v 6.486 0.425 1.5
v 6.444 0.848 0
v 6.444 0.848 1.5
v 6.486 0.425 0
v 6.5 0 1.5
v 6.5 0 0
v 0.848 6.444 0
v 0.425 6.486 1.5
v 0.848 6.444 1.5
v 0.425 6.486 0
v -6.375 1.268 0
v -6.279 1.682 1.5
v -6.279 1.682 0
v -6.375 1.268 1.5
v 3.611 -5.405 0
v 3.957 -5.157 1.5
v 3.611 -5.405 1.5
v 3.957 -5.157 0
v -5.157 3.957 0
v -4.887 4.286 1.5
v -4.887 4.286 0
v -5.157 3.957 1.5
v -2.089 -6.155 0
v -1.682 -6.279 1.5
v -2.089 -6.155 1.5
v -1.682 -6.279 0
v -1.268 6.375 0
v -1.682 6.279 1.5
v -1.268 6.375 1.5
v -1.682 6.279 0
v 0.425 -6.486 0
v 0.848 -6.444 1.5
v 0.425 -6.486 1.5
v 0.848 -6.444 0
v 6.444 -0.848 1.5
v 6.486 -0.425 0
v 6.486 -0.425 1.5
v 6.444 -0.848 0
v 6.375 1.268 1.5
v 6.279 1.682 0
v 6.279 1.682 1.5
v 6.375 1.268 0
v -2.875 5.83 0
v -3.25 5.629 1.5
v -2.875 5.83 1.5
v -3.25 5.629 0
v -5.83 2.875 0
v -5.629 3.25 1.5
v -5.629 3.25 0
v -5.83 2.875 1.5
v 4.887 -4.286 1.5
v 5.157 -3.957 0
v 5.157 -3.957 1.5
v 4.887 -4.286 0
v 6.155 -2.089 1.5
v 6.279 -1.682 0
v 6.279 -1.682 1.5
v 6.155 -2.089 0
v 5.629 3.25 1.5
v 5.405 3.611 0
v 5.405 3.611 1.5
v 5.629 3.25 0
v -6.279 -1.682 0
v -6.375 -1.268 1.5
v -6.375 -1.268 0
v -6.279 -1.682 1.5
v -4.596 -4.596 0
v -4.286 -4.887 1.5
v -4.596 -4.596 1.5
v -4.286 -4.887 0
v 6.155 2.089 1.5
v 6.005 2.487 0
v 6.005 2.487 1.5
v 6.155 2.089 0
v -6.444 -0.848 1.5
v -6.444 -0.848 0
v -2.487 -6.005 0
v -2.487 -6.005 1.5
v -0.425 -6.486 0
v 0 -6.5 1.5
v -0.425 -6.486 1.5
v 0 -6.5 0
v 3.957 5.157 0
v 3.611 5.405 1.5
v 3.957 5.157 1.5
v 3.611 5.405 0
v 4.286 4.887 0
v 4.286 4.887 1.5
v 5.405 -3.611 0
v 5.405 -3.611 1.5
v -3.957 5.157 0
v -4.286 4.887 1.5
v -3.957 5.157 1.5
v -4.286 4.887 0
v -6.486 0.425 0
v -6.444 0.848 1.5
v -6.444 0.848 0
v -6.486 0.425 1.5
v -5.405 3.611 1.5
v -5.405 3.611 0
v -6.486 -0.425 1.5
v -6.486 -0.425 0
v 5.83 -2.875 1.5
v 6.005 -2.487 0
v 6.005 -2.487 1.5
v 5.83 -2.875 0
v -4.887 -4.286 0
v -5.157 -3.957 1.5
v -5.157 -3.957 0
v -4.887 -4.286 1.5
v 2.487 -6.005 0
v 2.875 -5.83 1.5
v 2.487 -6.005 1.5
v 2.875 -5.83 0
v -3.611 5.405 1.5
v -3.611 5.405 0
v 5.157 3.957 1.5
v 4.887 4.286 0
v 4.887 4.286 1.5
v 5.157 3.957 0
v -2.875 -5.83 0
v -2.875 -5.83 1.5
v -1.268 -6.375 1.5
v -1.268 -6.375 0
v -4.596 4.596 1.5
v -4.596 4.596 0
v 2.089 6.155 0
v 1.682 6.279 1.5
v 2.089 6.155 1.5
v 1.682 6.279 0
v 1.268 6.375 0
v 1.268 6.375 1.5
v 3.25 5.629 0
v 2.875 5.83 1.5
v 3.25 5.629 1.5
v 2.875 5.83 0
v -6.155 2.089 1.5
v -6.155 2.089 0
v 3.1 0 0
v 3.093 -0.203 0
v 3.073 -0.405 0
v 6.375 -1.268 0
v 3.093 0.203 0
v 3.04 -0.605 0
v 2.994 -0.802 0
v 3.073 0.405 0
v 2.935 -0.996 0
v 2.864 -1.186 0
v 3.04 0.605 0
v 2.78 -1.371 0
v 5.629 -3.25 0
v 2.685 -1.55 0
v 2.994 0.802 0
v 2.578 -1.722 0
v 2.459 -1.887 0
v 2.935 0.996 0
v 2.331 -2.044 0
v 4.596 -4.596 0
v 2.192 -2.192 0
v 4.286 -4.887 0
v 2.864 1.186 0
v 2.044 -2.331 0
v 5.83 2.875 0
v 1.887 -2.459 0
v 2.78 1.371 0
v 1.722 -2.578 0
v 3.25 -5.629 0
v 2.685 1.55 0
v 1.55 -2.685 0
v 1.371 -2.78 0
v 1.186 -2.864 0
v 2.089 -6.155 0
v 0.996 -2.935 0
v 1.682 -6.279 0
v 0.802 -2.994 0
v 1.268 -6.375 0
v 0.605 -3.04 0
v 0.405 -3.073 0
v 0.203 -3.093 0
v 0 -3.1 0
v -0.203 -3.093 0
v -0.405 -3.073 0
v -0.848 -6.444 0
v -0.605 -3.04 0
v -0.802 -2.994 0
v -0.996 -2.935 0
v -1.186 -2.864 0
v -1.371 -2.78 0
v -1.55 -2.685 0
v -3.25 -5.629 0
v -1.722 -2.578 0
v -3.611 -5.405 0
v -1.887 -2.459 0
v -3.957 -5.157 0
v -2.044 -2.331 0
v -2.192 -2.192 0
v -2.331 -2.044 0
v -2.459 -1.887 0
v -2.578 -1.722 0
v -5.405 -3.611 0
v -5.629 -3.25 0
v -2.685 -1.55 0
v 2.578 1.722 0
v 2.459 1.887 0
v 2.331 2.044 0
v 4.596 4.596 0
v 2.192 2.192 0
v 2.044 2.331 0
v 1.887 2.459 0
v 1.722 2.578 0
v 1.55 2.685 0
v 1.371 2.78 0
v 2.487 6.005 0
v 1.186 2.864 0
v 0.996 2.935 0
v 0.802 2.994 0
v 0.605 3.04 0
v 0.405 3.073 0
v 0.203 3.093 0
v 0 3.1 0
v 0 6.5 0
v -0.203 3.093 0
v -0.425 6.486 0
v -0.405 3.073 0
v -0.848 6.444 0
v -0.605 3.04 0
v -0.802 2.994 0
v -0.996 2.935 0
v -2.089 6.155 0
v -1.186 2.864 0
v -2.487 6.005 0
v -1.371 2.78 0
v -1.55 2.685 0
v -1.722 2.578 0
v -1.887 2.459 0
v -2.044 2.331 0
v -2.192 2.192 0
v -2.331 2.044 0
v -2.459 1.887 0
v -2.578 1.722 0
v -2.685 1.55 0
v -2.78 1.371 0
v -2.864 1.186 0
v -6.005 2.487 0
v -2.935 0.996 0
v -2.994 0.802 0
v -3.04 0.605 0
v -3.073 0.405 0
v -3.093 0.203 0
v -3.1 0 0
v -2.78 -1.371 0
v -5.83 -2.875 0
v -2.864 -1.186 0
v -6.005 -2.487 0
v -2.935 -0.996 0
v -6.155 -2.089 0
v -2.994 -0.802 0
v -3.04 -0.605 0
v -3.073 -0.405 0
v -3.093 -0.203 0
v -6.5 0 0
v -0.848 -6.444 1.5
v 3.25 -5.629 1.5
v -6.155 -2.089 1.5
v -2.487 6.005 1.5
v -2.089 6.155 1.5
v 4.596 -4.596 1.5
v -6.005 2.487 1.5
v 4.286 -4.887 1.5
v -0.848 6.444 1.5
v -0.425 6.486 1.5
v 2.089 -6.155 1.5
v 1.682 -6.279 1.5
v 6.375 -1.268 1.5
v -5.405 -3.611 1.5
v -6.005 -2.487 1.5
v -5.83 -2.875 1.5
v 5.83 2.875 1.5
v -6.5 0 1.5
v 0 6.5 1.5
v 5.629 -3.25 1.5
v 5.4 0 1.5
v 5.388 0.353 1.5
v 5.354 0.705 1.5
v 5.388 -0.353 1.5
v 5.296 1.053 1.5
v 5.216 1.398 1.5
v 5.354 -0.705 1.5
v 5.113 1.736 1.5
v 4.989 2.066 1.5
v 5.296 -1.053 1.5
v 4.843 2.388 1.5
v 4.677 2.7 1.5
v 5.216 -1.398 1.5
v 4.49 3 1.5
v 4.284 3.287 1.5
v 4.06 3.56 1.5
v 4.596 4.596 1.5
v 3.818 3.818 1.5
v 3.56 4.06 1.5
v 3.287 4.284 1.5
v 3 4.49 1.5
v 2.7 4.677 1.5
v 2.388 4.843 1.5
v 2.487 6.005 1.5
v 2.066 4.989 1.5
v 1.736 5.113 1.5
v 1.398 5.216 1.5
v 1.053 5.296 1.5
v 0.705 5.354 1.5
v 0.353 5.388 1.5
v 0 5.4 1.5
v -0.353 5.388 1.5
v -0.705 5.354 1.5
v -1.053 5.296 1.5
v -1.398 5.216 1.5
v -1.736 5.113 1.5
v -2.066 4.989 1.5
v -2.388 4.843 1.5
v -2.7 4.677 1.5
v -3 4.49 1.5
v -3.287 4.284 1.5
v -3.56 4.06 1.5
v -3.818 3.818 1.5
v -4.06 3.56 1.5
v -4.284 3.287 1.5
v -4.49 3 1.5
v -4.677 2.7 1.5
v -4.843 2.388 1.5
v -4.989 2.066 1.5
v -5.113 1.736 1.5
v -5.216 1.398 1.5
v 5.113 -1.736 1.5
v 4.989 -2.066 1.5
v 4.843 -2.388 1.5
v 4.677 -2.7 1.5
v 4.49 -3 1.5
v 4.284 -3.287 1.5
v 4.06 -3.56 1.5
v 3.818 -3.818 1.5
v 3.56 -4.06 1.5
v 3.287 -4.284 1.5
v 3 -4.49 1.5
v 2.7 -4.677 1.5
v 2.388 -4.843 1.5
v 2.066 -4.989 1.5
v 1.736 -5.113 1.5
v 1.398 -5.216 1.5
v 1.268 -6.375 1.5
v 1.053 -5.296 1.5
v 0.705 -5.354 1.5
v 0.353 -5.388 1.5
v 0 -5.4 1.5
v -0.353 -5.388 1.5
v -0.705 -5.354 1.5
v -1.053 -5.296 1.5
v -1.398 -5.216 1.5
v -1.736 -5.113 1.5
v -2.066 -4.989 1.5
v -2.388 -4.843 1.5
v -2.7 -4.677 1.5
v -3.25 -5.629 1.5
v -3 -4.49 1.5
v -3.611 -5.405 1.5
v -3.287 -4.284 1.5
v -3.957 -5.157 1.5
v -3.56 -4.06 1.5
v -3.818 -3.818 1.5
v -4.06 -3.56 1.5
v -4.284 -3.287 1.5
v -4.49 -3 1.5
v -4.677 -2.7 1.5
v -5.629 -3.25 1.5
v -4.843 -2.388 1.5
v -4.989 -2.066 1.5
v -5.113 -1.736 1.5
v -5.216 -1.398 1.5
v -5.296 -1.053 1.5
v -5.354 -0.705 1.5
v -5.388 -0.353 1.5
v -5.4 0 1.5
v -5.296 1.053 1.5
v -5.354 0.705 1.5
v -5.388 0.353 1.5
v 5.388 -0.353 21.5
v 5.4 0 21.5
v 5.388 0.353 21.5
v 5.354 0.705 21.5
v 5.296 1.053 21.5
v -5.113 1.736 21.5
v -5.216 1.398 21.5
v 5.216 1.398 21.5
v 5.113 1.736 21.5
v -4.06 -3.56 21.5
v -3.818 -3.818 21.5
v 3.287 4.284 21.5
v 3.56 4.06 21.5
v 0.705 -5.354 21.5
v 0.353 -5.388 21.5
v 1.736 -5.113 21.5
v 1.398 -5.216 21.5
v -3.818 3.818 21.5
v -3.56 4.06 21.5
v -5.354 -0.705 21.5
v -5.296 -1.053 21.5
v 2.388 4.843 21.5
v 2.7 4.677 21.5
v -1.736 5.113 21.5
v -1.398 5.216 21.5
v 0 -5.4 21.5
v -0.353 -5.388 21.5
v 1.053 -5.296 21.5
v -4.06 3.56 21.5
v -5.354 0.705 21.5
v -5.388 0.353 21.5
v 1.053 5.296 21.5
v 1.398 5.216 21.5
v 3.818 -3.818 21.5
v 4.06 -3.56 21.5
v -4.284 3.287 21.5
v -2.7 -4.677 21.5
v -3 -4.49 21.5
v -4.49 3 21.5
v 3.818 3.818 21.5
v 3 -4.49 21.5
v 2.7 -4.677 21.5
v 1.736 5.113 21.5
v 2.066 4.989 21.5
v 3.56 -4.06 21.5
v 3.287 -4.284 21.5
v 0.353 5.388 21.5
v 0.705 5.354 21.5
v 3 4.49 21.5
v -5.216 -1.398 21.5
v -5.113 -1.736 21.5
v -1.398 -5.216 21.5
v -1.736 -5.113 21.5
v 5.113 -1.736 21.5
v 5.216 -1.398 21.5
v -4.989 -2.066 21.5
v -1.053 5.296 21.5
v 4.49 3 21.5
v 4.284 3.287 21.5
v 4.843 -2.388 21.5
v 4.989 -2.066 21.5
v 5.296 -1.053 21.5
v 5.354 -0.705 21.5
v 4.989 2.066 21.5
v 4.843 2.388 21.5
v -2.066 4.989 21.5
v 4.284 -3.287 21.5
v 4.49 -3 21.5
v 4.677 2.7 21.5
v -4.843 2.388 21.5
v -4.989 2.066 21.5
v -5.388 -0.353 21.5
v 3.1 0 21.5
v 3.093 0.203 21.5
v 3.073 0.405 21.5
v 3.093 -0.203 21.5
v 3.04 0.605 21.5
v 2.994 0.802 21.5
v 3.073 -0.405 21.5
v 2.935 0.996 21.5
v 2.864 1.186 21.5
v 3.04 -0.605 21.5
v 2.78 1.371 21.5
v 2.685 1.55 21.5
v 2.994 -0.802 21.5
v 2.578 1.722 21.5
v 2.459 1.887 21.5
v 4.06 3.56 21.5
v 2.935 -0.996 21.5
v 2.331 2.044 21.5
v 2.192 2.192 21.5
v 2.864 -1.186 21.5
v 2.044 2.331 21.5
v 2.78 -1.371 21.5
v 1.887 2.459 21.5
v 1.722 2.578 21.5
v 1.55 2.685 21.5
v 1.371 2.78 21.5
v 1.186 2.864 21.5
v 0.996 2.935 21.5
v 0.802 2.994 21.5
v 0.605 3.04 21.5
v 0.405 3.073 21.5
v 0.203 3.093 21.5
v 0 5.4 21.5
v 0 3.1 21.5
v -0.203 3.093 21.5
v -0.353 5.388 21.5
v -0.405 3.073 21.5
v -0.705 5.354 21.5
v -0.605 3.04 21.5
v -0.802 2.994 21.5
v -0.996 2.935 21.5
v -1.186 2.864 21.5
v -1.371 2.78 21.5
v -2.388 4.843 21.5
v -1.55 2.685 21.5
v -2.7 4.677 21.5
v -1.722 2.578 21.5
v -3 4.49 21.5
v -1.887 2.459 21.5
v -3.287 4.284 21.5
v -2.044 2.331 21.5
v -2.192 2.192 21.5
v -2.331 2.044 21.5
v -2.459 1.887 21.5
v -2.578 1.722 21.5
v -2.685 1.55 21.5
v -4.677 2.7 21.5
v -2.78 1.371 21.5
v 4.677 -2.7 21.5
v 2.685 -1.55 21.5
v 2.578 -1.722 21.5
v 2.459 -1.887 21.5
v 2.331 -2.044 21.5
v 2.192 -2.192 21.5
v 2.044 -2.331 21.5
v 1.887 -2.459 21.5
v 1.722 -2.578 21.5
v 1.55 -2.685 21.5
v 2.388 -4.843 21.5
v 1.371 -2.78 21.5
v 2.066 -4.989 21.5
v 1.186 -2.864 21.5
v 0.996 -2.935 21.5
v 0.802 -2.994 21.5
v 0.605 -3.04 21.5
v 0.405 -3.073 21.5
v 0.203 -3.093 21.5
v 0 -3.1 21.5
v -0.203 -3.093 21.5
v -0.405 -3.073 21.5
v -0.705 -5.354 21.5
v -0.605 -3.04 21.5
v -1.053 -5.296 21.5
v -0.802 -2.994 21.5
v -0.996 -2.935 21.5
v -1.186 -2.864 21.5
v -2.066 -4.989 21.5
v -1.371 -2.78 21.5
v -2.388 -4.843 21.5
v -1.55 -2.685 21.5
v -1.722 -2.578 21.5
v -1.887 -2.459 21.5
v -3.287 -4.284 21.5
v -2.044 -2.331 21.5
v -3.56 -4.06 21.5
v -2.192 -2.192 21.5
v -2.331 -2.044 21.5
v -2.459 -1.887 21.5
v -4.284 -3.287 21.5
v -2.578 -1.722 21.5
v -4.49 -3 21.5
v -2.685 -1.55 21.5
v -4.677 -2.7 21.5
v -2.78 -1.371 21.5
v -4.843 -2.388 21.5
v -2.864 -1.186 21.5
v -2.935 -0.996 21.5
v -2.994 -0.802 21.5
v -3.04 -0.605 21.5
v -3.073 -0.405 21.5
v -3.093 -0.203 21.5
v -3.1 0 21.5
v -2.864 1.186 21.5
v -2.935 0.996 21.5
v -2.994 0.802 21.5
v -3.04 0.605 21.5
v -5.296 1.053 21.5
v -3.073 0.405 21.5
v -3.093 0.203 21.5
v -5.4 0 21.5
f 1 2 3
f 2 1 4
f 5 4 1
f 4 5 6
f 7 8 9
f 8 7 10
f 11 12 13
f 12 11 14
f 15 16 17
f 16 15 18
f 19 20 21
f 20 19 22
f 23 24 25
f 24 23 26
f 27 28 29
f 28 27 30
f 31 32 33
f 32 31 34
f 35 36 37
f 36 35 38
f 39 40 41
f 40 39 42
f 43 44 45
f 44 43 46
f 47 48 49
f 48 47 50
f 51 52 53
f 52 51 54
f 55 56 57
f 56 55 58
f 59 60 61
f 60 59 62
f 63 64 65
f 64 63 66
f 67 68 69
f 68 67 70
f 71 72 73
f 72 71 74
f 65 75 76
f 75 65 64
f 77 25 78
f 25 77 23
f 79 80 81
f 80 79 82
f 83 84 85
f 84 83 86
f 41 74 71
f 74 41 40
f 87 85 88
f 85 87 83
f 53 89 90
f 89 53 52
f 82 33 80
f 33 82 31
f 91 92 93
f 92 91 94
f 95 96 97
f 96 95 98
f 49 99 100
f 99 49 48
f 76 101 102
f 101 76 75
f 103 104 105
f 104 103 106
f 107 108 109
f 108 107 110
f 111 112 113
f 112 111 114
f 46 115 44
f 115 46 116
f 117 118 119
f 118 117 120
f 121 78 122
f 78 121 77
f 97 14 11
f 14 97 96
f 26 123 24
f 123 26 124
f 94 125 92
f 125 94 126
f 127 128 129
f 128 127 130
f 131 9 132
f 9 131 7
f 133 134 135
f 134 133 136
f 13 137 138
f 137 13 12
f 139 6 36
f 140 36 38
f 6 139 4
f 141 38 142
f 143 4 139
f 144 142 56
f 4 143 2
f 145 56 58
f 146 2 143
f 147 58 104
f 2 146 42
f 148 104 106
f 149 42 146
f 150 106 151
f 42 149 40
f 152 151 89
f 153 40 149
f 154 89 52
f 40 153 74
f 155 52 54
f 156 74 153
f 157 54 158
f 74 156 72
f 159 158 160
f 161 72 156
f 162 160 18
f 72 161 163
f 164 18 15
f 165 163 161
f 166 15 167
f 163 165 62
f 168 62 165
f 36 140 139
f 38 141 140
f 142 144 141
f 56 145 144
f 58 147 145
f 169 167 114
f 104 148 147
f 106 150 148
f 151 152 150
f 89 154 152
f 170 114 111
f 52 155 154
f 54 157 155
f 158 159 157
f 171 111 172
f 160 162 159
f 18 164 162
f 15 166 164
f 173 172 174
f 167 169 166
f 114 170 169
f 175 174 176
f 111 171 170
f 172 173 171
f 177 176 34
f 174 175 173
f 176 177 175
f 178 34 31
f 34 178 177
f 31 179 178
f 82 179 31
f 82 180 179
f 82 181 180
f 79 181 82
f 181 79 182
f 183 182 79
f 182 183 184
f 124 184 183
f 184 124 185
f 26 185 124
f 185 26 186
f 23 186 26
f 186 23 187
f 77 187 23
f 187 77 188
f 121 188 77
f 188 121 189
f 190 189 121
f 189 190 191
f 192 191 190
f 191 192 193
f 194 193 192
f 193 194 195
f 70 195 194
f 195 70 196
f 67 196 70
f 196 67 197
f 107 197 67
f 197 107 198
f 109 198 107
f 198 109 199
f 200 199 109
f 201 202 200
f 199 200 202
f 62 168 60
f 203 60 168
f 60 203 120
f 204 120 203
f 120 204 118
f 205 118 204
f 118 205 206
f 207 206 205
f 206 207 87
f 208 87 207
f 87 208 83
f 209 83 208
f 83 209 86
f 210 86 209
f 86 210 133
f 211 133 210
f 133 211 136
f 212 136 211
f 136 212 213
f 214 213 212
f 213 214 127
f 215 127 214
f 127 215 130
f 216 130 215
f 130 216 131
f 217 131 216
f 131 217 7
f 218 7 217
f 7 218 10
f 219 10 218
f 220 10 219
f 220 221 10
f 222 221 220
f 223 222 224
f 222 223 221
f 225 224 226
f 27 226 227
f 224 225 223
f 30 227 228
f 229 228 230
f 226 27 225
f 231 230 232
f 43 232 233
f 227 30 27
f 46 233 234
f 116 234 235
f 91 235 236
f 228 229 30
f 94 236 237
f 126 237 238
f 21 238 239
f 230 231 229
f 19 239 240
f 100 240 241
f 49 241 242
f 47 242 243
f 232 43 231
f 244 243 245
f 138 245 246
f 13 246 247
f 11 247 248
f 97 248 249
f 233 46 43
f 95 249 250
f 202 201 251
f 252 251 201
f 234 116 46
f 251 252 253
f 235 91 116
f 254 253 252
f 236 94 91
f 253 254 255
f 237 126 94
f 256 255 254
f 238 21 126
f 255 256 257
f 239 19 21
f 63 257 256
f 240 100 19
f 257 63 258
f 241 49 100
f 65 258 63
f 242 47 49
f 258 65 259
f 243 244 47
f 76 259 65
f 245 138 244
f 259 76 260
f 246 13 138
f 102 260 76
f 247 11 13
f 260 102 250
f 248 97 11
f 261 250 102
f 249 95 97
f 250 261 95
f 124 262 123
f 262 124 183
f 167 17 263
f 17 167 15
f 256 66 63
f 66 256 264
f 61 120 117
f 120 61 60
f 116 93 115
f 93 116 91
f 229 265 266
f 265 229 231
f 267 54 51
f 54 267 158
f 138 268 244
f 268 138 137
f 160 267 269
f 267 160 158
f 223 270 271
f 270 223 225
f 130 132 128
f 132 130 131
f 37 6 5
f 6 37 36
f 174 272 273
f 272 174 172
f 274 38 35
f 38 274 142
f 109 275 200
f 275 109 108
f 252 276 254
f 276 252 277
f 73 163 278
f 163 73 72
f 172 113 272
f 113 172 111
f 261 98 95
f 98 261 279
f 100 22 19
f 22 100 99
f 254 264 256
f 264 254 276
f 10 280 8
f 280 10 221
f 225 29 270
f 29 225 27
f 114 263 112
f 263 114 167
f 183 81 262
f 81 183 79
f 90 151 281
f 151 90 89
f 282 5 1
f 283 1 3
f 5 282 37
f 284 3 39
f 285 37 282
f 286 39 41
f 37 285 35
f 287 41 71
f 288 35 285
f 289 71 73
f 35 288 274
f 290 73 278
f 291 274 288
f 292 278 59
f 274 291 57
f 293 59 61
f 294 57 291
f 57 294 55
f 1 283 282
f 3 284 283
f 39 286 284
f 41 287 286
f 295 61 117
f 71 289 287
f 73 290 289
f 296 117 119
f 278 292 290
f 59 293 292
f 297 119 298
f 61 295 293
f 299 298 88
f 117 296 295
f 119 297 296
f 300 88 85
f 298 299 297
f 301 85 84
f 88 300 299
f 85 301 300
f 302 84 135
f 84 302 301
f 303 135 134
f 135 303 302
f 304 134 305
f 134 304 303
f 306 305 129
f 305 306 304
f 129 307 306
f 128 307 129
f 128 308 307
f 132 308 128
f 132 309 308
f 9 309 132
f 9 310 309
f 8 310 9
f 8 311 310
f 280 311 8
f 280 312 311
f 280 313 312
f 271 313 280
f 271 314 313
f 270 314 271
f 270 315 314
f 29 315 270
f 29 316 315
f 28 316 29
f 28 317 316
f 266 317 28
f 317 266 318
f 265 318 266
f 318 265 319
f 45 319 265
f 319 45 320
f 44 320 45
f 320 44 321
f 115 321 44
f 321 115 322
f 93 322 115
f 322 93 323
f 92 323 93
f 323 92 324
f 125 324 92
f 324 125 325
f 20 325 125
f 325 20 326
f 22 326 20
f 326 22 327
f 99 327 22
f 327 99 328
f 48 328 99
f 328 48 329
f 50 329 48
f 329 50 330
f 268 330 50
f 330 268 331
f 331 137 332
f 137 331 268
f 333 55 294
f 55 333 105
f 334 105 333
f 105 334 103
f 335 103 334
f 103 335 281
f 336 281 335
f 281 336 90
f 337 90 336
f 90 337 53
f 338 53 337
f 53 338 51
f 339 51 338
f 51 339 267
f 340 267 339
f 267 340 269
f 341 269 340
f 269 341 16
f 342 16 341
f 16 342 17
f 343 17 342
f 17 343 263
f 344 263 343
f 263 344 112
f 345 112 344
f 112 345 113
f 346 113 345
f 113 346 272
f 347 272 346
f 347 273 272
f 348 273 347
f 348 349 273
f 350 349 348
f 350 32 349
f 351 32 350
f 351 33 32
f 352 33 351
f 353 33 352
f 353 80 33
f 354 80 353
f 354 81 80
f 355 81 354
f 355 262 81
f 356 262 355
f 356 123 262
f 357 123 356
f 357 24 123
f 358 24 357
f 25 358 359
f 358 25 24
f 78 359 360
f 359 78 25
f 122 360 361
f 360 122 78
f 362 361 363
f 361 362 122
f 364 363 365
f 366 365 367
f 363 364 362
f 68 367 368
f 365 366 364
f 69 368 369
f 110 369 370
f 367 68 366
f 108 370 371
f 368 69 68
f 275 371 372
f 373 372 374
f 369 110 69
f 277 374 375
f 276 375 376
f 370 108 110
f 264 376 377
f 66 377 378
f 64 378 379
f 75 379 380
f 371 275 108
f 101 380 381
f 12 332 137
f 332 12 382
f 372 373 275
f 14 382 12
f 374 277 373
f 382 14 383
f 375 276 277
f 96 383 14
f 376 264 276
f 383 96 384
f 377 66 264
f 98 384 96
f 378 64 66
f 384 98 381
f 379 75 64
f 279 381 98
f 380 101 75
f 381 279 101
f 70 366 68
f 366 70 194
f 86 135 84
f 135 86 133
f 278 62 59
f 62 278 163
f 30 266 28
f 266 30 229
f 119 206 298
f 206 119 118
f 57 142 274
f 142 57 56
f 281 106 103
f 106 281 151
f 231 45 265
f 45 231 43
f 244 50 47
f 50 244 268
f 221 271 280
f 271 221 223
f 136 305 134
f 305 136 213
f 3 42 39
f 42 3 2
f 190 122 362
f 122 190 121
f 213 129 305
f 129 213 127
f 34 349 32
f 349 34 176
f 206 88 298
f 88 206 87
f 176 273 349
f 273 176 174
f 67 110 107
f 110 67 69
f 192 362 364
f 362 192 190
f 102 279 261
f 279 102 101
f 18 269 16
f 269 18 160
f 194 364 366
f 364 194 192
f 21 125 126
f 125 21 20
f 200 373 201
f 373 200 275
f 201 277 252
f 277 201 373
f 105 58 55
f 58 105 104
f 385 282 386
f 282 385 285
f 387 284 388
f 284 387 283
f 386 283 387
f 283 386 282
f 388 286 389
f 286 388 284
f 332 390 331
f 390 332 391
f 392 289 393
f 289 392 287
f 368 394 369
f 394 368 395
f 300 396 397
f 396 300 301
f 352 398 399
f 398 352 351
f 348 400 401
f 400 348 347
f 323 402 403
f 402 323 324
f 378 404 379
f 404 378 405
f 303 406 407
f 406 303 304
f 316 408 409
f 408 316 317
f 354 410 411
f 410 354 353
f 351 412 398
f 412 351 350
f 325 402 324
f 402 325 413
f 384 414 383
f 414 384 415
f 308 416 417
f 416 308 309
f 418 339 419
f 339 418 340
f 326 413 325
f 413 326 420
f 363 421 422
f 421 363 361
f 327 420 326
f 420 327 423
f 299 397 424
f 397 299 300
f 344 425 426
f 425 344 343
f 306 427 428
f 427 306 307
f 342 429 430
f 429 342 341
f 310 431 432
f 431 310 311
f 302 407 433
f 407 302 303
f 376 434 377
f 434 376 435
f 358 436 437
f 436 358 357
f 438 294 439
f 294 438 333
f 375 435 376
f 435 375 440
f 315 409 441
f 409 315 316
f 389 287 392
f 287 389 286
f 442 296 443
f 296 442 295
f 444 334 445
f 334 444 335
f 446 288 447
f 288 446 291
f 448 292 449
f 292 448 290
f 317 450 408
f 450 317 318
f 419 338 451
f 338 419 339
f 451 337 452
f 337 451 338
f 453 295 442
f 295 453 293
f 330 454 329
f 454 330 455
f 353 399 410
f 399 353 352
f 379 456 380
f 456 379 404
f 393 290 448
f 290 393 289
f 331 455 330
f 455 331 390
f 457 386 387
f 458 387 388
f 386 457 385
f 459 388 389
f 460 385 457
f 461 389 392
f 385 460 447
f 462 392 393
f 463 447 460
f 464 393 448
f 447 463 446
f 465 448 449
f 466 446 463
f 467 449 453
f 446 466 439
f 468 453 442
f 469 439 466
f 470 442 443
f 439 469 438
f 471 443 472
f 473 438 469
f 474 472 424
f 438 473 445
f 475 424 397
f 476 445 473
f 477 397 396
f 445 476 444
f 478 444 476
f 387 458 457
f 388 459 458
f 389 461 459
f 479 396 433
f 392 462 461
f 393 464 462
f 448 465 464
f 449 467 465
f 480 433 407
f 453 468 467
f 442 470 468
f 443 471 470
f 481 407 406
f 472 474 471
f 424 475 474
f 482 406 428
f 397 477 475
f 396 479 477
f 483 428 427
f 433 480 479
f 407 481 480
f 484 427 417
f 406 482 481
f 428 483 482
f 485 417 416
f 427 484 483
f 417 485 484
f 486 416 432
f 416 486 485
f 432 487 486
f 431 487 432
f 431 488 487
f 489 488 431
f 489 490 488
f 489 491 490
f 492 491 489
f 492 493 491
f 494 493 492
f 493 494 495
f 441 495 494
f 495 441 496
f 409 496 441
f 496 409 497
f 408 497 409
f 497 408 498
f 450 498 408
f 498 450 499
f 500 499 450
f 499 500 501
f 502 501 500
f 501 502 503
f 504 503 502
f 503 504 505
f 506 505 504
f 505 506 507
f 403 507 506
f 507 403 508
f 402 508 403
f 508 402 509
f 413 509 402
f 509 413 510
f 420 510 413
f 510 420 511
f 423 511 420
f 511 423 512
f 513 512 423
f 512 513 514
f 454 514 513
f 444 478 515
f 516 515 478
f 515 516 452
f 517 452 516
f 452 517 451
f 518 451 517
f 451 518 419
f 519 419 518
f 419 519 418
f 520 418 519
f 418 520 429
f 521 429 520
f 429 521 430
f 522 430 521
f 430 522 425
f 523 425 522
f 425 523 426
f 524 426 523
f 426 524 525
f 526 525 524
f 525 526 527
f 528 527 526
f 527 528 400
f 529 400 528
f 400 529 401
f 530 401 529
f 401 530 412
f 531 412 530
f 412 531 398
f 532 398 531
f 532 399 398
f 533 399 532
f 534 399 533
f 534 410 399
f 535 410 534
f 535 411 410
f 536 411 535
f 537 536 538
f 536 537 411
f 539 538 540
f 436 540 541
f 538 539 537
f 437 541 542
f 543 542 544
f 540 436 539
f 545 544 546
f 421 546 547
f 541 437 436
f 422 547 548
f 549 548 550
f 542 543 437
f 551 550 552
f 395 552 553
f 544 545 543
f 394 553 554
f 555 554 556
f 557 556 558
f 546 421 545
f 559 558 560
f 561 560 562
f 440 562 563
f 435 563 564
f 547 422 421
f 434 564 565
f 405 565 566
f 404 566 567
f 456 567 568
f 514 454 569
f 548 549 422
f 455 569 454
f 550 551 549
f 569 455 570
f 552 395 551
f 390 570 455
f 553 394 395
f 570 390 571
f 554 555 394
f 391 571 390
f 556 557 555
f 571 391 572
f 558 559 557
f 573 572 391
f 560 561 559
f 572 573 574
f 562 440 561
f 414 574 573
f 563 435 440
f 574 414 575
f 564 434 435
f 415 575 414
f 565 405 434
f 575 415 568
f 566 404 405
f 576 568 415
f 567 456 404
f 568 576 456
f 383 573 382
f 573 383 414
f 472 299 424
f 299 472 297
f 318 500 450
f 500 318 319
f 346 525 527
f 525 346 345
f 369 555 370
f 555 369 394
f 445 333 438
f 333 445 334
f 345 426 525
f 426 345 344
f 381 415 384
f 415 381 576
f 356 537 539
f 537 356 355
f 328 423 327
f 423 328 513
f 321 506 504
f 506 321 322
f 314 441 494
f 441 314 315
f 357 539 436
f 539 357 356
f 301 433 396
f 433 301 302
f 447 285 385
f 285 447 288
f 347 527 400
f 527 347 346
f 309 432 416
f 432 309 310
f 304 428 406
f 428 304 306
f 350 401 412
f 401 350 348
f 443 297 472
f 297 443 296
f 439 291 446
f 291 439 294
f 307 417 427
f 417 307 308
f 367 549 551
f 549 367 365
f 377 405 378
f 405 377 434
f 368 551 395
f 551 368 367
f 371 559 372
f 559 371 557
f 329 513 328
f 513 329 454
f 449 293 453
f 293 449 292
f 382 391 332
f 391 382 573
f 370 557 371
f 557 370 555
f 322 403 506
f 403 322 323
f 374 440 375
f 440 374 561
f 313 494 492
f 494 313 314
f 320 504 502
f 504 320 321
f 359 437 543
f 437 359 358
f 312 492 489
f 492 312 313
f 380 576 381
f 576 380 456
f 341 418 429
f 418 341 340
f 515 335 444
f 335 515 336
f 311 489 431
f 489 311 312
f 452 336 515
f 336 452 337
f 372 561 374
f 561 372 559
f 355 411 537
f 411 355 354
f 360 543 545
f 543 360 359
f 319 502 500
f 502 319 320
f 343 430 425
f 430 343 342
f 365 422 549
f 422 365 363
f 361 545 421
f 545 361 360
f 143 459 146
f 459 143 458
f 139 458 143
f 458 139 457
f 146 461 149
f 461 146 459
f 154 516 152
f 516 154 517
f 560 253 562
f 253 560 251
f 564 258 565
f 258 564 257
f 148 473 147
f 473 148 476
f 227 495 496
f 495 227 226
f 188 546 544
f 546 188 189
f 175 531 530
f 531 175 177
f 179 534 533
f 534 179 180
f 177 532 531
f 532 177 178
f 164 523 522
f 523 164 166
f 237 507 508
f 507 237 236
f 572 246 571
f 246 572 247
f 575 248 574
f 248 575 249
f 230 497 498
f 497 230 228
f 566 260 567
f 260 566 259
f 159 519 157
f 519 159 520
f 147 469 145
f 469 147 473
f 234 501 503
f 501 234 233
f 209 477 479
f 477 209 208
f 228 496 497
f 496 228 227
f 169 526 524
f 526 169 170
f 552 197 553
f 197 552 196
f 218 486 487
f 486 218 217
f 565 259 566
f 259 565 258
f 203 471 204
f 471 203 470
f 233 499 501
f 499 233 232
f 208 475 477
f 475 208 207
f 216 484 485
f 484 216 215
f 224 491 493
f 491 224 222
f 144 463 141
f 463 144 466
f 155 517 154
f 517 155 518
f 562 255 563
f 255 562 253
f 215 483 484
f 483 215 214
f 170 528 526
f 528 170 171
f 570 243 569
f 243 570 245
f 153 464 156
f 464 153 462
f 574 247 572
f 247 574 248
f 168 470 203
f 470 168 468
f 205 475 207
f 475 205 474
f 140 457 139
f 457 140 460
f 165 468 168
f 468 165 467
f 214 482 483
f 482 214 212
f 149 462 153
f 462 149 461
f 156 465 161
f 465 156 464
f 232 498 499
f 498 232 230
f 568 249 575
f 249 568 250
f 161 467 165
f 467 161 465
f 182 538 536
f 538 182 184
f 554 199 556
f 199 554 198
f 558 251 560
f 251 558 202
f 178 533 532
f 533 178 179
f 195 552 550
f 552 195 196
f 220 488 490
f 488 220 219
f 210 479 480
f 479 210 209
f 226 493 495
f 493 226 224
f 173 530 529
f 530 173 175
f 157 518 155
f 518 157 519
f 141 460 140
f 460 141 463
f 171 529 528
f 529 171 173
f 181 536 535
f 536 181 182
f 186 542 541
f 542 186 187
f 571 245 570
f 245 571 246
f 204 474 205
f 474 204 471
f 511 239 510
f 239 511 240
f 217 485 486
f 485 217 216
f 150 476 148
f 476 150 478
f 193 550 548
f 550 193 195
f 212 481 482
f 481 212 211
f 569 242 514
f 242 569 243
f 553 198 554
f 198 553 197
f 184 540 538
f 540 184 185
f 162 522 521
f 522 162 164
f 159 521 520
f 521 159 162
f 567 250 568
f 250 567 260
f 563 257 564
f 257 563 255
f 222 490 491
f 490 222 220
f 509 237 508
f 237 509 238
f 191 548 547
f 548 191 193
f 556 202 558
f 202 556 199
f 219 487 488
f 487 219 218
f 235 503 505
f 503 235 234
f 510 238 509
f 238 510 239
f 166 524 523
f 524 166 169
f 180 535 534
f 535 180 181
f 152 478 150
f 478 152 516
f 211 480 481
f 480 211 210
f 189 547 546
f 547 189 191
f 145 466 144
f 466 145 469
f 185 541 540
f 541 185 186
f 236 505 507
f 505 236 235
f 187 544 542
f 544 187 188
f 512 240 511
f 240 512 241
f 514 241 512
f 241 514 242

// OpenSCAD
// PCR tube adapter sleeve: fits a 0.2 mL tube into a 1.5 mL rack hole
// Print orientation: collar on the bed (z = 0), sleeve body rises to z = 21.5

// ---------------- Parameters ----------------
collar_d      = 13;    // collar outer diameter (mm)
collar_h      = 1.5;   // collar thickness (mm)
sleeve_od     = 10.8;  // sleeve body outer diameter (mm)
sleeve_h      = 20;    // sleeve body height above collar (mm)
bore_d        = 6.2;   // through-bore diameter (mm)
eps           = 0.5;   // cutter overshoot past faces (mm)

$fn = 96;              // facet count for round features

// ---------------- Derived ----------------
sleeve_top_z   = collar_h + sleeve_h;   // 21.5 mm overall height
sleeve_id      = sleeve_od - bore_d;    // inner diameter of sleeve body
collar_id      = collar_d - bore_d;     // inner diameter of collar

// ---------------- Model ----------------
difference() {
    union() {
        // Collar: rests on z = 0, extends to collar_h
        cylinder(d = collar_d, h = collar_h);

        // Sleeve body: sits on top of the collar, runs from collar_h to sleeve_top_z
        translate([0, 0, collar_h])
            cylinder(d = sleeve_od, h = sleeve_h);
    }

    // Through-bore: starts below z = 0 and ends above sleeve_top_z,
    // so it is open at both ends and cuts cleanly through every face
    translate([0, 0, -eps])
        cylinder(d = bore_d, h = sleeve_top_z + 2 * eps);
}
